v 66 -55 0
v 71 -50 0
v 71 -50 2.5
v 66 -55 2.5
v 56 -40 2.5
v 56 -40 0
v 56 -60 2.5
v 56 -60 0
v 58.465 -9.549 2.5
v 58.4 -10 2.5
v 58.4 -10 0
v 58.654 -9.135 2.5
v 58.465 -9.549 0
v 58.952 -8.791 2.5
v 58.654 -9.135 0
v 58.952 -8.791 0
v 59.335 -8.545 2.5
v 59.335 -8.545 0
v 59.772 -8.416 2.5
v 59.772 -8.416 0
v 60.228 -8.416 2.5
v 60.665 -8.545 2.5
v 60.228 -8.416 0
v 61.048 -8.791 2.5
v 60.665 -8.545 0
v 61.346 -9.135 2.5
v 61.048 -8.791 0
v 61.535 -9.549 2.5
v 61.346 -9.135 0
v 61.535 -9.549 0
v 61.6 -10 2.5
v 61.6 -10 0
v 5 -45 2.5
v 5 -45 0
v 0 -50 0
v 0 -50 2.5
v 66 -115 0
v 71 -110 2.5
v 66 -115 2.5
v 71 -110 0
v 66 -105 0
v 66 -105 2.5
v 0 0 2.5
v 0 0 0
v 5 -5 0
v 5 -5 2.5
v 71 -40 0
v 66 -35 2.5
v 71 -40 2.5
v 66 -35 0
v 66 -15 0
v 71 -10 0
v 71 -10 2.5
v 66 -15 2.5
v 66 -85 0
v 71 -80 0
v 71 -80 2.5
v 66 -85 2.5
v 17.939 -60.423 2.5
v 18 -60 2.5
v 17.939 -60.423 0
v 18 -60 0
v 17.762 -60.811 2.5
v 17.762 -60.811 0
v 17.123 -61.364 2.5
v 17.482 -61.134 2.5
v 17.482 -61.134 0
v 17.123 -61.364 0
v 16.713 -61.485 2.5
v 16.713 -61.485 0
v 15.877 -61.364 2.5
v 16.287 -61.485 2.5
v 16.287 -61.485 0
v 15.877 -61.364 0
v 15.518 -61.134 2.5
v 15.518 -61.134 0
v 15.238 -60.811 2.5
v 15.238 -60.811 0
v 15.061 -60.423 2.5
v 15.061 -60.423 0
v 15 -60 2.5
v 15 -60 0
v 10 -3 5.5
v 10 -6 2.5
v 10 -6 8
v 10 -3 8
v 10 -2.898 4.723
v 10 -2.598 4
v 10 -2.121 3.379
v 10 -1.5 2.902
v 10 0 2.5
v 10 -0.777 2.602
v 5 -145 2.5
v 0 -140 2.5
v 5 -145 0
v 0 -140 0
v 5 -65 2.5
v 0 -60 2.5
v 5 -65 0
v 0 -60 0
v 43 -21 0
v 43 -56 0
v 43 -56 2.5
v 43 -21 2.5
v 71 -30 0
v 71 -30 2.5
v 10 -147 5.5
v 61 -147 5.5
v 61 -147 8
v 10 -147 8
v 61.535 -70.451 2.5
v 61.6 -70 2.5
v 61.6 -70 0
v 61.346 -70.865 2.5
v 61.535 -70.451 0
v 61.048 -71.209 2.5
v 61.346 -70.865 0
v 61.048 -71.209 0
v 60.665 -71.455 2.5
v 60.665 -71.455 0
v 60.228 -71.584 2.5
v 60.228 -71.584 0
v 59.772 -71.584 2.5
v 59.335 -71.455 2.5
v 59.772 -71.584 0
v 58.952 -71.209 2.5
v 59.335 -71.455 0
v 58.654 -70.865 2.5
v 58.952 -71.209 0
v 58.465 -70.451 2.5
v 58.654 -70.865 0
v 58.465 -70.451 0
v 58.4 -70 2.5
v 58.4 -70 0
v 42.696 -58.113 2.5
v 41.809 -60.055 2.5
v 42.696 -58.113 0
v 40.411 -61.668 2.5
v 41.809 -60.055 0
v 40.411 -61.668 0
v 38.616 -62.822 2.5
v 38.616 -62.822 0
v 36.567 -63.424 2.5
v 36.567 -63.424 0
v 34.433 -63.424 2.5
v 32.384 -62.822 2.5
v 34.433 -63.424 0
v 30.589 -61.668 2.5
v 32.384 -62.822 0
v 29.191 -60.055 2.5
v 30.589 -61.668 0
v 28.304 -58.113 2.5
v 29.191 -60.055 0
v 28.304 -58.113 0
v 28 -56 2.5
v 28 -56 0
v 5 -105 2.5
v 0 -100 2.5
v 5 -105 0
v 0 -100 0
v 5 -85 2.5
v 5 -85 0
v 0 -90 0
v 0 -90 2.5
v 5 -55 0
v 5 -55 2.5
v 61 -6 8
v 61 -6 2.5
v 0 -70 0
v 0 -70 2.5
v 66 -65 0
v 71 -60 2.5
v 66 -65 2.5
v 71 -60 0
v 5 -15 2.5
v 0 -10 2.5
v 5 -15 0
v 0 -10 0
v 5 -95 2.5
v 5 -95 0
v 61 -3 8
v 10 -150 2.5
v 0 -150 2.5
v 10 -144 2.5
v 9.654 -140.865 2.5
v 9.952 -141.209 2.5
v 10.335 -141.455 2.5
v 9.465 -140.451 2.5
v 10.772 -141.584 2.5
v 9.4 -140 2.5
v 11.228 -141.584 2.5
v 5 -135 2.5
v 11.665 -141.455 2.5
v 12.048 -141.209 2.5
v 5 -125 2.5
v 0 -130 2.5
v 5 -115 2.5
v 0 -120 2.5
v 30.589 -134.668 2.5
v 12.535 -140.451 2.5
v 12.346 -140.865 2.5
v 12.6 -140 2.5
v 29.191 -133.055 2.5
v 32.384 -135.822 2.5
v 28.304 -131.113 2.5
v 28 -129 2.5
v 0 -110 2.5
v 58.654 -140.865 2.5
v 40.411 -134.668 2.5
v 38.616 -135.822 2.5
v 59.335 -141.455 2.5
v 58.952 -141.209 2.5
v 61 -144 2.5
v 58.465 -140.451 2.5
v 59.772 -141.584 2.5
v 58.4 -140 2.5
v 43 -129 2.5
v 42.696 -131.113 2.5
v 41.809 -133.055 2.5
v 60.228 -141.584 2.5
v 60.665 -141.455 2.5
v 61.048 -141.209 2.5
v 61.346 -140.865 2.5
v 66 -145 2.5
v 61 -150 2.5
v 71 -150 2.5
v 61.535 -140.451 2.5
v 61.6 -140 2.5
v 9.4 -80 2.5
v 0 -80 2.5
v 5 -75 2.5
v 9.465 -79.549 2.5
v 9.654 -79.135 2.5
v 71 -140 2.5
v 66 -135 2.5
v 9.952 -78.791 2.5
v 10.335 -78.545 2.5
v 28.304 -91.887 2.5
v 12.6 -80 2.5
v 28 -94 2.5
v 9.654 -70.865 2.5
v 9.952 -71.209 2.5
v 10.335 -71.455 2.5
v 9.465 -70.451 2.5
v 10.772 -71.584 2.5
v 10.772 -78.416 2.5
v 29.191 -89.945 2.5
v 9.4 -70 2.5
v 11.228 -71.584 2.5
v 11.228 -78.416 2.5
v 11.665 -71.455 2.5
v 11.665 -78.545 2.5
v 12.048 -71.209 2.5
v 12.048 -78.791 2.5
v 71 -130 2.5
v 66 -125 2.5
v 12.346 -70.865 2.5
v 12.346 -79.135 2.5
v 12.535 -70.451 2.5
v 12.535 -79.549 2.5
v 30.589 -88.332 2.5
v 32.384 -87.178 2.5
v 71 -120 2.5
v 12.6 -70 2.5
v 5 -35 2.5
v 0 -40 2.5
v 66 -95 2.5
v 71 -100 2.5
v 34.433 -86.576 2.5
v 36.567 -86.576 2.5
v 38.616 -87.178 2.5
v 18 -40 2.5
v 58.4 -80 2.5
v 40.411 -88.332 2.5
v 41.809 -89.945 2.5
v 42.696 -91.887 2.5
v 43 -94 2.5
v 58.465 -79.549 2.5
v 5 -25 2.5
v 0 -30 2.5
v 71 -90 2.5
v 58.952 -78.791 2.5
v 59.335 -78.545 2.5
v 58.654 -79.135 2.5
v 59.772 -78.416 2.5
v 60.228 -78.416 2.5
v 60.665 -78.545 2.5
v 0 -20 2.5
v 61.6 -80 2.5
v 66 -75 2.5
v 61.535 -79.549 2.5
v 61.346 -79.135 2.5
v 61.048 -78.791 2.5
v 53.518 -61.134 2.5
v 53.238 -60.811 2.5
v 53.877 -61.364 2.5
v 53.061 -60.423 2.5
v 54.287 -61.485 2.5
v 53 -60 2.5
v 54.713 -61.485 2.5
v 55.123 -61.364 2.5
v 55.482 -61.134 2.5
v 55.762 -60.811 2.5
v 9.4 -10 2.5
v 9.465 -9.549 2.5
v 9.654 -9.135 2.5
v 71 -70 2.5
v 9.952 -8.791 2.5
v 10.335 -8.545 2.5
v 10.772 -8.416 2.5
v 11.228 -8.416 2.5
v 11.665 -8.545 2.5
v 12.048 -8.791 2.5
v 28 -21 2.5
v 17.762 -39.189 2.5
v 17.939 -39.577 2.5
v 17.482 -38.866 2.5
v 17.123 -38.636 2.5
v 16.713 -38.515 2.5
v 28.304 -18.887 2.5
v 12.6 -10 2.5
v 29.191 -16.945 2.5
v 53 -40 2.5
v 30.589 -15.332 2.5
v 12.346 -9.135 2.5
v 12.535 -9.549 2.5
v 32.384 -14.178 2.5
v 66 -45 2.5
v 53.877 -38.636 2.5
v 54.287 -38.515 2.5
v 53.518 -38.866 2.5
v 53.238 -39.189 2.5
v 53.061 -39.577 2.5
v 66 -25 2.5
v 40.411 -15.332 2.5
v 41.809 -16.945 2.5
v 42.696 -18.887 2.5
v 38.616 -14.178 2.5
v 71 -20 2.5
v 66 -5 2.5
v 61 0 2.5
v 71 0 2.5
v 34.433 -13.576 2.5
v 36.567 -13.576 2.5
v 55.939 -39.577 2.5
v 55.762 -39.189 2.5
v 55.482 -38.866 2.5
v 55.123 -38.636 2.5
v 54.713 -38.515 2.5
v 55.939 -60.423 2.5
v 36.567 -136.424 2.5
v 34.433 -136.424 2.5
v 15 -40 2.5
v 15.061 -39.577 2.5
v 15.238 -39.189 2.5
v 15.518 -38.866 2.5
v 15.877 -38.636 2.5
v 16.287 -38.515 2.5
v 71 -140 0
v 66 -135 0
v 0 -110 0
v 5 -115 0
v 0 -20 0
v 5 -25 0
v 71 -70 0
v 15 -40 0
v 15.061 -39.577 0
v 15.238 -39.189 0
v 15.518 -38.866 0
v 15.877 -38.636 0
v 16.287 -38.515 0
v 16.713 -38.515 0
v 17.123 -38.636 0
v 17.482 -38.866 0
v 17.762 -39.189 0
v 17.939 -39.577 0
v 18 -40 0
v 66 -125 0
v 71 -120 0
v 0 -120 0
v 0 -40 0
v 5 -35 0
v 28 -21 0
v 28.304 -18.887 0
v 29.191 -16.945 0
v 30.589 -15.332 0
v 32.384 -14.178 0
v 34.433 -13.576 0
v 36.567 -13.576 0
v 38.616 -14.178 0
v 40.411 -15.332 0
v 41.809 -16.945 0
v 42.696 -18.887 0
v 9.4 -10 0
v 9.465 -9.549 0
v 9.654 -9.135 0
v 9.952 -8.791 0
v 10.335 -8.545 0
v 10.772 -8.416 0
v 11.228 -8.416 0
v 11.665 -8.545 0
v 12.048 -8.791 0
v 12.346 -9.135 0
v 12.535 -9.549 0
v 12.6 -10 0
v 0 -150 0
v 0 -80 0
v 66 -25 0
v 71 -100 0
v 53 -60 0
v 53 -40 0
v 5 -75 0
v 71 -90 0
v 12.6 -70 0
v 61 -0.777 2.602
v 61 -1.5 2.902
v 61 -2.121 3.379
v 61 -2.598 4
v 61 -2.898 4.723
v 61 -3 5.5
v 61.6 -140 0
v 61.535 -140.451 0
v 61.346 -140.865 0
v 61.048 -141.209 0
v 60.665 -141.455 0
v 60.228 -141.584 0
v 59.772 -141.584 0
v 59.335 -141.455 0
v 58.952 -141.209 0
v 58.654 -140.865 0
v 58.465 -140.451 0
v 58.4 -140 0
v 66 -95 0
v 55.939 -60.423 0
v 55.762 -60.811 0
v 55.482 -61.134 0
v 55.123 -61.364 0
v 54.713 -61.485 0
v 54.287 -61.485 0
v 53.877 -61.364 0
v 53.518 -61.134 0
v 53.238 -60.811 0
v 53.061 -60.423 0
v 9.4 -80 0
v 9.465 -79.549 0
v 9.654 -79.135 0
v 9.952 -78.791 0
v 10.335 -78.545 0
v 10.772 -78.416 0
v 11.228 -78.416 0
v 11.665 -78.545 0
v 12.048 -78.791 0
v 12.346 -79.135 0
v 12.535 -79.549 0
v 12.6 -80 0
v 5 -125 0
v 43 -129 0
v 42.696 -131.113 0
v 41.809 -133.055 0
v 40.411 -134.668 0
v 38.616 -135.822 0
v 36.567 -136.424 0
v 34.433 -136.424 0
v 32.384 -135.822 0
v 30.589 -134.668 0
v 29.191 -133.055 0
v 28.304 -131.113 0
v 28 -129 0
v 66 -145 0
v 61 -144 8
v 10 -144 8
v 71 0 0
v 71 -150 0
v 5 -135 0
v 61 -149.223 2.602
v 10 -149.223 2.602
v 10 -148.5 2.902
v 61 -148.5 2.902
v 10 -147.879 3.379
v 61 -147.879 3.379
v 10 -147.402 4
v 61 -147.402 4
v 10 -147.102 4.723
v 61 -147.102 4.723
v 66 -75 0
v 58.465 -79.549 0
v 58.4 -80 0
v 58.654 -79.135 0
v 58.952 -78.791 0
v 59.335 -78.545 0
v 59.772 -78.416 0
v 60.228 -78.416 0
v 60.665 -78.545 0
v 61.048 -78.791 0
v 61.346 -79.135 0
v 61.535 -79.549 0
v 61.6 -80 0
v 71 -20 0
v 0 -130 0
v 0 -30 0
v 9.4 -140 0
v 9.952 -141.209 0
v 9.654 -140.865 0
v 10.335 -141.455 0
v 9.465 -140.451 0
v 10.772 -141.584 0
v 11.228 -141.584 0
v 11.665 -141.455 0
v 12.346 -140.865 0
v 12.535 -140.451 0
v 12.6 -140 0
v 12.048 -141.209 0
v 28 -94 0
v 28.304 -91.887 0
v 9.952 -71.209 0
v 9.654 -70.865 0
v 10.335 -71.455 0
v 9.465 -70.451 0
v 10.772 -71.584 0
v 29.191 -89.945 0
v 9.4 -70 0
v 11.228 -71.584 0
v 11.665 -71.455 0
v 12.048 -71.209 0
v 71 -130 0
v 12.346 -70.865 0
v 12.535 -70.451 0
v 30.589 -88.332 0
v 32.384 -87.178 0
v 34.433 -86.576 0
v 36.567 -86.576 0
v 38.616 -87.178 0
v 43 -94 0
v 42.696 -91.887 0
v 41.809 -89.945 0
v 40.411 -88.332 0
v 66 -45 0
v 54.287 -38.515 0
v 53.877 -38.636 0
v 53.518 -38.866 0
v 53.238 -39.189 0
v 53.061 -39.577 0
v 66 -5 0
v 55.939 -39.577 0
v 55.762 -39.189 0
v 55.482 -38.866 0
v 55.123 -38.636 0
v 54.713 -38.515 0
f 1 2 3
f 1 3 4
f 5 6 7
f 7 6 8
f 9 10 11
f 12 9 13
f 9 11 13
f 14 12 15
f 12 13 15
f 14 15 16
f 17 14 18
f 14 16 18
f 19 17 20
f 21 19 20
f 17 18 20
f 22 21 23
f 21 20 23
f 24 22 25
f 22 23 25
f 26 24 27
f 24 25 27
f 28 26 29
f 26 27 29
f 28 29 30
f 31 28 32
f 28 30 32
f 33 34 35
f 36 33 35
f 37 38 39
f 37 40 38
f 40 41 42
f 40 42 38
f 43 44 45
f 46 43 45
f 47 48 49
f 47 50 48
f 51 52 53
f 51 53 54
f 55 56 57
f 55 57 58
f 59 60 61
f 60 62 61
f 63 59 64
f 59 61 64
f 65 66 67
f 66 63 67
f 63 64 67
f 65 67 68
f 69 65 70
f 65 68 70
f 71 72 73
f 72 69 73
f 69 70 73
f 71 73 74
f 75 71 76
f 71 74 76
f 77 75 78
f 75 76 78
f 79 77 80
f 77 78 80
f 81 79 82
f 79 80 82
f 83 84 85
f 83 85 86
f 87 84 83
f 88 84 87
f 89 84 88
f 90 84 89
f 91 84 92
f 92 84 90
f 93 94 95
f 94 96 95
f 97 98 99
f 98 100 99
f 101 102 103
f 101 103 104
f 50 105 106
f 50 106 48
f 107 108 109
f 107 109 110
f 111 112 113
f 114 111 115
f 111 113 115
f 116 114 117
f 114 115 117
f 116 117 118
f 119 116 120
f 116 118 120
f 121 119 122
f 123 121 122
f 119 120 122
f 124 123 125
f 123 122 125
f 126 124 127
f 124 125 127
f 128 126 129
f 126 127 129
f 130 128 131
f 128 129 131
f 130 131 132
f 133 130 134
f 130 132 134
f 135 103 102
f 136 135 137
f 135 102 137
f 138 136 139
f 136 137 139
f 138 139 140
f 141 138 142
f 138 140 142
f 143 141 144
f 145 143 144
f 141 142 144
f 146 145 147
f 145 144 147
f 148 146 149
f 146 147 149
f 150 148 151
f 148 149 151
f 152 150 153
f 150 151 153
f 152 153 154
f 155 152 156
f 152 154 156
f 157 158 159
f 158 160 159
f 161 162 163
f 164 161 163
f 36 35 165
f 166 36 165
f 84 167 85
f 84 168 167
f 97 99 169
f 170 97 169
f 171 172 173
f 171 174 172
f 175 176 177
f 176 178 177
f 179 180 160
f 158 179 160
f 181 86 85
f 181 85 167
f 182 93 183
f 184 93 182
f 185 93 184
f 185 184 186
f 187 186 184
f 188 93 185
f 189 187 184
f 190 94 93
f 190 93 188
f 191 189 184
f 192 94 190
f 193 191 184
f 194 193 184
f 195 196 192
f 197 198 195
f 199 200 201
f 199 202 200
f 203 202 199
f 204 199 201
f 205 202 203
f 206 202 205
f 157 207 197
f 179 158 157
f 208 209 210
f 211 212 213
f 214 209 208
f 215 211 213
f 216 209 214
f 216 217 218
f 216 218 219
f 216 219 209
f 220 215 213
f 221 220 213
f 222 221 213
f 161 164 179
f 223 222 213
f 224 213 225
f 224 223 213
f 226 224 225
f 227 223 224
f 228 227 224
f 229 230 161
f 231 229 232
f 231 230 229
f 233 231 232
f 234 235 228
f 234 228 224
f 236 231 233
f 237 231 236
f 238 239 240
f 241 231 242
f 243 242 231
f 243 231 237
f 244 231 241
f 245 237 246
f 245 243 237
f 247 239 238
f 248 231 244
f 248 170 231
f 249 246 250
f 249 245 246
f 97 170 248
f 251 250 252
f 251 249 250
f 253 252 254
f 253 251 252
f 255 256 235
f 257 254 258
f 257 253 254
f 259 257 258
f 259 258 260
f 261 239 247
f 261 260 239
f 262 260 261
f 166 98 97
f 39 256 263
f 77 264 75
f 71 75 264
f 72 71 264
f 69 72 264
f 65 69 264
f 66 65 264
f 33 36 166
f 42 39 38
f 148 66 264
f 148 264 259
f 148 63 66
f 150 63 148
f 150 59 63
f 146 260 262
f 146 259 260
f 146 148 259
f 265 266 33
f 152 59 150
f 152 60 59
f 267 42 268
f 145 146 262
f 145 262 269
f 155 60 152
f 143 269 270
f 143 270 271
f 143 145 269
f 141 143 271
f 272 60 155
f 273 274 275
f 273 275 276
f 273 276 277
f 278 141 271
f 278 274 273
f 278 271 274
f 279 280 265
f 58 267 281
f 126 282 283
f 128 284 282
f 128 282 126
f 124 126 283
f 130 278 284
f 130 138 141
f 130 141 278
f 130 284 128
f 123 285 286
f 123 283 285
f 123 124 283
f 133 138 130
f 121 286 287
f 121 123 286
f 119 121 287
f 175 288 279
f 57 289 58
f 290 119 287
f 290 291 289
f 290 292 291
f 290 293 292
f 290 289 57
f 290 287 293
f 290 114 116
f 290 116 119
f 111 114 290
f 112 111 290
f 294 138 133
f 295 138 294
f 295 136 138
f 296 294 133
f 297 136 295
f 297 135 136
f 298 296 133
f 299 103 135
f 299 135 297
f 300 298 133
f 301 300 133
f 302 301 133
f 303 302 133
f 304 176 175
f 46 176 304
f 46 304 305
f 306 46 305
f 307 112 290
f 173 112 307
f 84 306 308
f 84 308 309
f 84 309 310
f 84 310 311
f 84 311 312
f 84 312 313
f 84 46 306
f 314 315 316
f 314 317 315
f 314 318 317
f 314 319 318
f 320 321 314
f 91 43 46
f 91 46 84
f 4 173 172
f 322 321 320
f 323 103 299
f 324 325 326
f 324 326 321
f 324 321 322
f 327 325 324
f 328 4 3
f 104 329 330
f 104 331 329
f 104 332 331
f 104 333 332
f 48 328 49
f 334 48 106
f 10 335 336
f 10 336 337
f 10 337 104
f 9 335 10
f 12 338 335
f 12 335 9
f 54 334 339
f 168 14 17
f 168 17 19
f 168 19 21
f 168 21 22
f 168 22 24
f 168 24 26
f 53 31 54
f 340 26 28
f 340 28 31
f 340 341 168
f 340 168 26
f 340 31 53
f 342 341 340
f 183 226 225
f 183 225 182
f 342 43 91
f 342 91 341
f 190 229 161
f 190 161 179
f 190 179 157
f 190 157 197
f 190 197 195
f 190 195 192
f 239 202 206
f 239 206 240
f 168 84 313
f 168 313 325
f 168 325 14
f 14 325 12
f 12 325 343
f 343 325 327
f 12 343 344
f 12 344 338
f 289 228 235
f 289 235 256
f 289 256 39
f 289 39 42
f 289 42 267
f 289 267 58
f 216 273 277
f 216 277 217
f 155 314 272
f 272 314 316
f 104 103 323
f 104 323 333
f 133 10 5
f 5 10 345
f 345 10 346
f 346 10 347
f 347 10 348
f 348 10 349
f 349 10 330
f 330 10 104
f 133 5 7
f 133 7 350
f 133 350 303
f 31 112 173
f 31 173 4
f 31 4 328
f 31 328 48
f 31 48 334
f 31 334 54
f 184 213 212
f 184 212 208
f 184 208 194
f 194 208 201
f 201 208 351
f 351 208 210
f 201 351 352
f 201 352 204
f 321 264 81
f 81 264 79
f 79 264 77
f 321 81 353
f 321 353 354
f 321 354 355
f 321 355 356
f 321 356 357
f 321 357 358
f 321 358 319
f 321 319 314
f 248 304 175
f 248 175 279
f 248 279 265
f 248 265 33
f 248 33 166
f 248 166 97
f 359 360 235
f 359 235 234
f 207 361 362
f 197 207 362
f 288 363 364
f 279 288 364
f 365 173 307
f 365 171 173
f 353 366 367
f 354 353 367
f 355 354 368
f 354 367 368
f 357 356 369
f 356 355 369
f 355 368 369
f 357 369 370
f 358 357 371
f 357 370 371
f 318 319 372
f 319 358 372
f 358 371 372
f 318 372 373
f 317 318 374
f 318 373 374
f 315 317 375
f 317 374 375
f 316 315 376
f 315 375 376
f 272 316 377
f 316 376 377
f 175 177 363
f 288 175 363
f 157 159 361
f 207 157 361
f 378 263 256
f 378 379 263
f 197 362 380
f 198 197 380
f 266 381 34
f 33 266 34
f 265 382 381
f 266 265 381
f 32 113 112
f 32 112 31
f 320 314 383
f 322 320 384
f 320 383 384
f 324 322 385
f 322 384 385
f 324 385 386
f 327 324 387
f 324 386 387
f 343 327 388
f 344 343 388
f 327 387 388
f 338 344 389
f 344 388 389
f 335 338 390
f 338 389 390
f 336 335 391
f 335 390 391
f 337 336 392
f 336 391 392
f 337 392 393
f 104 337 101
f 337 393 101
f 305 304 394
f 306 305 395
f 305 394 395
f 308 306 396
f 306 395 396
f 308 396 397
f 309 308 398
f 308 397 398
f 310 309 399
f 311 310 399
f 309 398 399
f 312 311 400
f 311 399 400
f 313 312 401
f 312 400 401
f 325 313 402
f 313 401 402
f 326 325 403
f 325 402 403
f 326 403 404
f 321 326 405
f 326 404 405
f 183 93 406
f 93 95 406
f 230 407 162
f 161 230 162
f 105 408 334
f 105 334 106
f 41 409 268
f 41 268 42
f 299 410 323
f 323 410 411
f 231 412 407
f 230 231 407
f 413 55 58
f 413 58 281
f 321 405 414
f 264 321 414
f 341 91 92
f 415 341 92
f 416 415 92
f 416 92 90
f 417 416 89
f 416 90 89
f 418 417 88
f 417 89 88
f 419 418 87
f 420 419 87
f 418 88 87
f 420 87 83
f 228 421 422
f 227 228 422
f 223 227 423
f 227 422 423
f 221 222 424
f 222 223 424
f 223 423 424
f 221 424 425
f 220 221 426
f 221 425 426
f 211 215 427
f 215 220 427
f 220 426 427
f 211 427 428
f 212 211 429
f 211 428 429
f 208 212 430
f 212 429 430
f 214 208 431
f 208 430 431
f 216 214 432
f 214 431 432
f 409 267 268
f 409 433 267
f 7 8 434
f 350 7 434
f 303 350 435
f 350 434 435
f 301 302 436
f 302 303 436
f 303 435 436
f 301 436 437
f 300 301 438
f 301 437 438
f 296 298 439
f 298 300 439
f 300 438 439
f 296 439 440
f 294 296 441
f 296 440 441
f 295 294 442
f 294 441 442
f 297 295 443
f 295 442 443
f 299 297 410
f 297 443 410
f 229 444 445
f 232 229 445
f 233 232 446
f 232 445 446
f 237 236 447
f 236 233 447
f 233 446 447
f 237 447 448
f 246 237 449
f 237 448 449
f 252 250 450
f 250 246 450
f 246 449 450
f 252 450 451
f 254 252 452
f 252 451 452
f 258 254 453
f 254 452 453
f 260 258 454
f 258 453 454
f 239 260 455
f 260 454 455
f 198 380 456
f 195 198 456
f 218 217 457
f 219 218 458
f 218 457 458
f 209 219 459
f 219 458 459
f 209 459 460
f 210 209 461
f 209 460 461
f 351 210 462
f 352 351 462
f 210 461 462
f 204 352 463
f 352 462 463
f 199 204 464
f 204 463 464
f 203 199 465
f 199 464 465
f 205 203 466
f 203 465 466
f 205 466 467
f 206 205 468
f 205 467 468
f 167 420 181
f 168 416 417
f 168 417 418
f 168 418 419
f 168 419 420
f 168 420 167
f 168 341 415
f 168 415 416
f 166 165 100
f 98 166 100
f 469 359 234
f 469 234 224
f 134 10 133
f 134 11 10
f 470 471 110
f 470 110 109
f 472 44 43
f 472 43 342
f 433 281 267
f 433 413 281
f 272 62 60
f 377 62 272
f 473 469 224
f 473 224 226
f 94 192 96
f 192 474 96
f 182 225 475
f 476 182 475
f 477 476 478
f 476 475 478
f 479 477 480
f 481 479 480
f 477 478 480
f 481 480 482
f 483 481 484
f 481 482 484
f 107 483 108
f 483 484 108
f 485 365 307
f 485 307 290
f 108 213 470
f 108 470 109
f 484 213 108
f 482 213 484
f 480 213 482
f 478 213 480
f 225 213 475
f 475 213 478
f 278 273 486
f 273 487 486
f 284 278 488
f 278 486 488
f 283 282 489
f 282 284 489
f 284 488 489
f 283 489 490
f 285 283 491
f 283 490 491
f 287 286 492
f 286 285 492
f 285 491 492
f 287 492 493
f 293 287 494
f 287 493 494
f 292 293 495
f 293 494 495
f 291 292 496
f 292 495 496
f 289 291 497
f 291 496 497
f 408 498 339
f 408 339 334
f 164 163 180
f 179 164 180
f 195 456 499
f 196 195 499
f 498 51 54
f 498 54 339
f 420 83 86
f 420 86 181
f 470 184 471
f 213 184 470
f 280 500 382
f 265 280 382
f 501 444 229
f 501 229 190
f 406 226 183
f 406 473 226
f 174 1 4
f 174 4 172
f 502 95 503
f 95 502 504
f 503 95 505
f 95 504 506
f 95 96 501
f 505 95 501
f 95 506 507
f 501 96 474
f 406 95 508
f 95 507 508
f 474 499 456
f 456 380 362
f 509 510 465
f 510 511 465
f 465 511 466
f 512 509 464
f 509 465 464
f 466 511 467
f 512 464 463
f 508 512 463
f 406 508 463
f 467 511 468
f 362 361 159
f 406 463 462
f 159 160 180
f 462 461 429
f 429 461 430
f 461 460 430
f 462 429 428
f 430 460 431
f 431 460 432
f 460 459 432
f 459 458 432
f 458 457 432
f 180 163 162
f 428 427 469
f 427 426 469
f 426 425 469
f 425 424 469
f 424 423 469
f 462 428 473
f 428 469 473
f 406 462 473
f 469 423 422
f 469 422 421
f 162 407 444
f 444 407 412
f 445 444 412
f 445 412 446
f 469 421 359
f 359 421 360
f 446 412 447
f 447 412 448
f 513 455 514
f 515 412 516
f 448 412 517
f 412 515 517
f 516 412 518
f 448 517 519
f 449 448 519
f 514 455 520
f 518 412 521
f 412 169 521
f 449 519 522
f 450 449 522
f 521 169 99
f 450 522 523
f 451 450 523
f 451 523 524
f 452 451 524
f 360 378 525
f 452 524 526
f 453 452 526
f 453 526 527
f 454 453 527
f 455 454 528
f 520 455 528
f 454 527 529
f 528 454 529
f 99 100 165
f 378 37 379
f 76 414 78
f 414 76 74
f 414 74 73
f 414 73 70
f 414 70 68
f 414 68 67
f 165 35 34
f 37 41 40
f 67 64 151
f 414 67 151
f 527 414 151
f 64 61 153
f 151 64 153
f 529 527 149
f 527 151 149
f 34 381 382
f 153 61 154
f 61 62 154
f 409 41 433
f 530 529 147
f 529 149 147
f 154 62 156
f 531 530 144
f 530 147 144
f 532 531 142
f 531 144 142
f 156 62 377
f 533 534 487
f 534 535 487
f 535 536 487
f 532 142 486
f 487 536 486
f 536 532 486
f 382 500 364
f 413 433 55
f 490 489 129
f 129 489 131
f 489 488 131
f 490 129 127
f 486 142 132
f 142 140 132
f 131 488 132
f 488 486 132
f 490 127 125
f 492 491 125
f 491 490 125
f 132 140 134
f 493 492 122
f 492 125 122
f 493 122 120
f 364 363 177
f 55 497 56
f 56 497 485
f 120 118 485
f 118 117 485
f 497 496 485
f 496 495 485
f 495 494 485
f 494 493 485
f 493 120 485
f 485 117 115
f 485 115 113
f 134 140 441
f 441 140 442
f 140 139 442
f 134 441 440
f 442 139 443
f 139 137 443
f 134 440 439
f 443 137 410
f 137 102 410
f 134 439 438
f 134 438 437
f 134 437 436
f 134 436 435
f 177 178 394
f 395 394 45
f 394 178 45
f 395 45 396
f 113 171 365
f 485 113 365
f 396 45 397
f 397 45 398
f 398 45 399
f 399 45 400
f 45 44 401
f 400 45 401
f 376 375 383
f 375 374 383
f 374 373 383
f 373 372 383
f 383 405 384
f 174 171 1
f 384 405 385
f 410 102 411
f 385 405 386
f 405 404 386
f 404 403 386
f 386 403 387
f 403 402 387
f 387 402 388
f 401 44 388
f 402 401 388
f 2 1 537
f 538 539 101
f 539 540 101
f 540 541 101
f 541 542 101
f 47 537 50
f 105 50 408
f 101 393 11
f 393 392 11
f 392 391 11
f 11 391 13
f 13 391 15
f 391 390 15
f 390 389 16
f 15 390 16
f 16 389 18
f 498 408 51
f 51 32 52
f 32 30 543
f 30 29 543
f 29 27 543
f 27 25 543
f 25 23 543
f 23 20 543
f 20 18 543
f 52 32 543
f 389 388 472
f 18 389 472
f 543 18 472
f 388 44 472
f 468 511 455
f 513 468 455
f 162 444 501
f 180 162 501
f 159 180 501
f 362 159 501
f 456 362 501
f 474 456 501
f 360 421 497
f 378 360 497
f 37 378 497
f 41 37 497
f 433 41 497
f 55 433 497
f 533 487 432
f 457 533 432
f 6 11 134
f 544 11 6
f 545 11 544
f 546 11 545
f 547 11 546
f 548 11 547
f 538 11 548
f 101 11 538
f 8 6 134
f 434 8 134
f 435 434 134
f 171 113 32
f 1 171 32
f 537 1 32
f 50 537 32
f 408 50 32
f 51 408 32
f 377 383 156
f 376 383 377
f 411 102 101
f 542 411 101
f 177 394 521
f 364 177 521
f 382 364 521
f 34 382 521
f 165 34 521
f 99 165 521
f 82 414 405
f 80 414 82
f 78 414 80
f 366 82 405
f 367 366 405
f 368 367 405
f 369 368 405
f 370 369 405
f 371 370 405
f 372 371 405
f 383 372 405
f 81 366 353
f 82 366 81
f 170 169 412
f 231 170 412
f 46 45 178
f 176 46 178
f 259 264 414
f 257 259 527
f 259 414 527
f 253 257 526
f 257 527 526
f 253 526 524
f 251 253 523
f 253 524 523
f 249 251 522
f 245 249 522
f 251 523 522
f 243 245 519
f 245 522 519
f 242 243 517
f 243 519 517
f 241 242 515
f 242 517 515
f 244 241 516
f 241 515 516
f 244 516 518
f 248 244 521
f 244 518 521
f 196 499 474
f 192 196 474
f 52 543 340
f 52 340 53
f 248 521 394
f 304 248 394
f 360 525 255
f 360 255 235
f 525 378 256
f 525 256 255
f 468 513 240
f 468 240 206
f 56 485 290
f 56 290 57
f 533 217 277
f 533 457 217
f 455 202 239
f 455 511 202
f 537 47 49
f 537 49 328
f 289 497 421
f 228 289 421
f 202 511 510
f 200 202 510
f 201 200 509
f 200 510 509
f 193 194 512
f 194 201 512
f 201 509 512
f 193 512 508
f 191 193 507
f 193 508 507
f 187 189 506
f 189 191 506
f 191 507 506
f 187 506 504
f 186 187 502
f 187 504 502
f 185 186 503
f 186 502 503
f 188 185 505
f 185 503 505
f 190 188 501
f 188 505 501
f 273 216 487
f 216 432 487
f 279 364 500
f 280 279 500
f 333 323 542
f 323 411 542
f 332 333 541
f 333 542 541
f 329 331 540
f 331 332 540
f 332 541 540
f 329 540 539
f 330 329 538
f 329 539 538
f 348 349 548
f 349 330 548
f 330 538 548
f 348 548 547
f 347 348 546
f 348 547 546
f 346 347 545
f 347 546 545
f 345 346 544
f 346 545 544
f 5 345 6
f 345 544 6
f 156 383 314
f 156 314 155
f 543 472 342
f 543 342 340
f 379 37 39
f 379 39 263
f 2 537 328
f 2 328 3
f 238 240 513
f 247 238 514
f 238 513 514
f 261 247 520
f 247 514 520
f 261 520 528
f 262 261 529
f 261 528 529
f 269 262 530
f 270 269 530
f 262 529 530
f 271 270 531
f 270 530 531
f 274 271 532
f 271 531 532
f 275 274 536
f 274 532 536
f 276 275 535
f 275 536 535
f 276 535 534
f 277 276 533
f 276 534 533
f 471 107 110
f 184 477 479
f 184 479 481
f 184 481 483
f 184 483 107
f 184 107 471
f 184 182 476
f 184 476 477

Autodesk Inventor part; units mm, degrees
ref_plane "YZ Plane" through (0, 0, 0) normal (1, 0, 0) x (0, 1, 0)
ref_plane "XZ Plane" through (0, 0, 0) normal (0, 1, 0) x (-1, 0, 0)
ref_plane "XY Plane" through (0, 0, 0) normal (0, 0, 1) x (1, 0, 0)
sketch "Sketch1" plane through (0, 0, 0) normal (0, 0, 1) x (1, 0, 0)
  line L0 (0, 0) -> (71, 0)
  line L1 (71, 0) -> (71, -150)
  line L2 (71, -150) -> (0, -150)
  line L3 (0, -150) -> (0, 0)
  line L4 (7.6868, 0) -> (92.3291, 0)
  line L5 (9.7325, -150) -> (92.3291, -150)
  line L6 (9.7325, -150) -> (11.7224, -150)
  line L7 (0, 0) -> (5, -5)
  line L8 (0, 0) -> (7.0711, 0) construction
  line L9 (5, -5) -> (0, -10)
  line L10 (0, -10) -> (5, -15)
  line L11 (5, -15) -> (0, -20)
  line L12 (0, -20) -> (5, -25)
  line L13 (5, -25) -> (0, -30)
  line L14 (0, -30) -> (5, -35)
  line L15 (5, -35) -> (0, -40)
  line L16 (0, -40) -> (5, -45)
  line L17 (5, -45) -> (0, -50)
  line L18 (0, -50) -> (5, -55)
  line L19 (5, -55) -> (0, -60)
  line L20 (0, -60) -> (5, -65)
  line L21 (5, -65) -> (0, -70)
  line L22 (0, -70) -> (5, -75)
  line L23 (5, -75) -> (0, -80)
  line L24 (0, -80) -> (5, -85)
  line L25 (5, -85) -> (0, -90)
  line L26 (0, -90) -> (5, -95)
  line L27 (5, -95) -> (0, -100)
  line L28 (0, -100) -> (5, -105)
  line L29 (5, -105) -> (0, -110)
  line L30 (0, -110) -> (5, -115)
  line L31 (5, -115) -> (0, -120)
  line L32 (0, -120) -> (5, -125)
  line L33 (5, -125) -> (0, -130)
  line L34 (0, -130) -> (5, -135)
  line L35 (5, -135) -> (0, -140)
  line L36 (35.5, 0) -> (35.5, -140) construction
  line L37 (71, 0) -> (66, -5)
  line L38 (66, -5) -> (71, -10)
  line L39 (71, -10) -> (66, -15)
  line L40 (66, -15) -> (71, -20)
  line L41 (71, -20) -> (66, -25)
  line L42 (66, -25) -> (71, -30)
  line L43 (71, -30) -> (66, -35)
  line L44 (66, -35) -> (71, -40)
  line L45 (71, -40) -> (66, -45)
  line L46 (66, -45) -> (71, -50)
  line L47 (71, -50) -> (66, -55)
  line L48 (66, -55) -> (71, -60)
  line L49 (71, -60) -> (66, -65)
  line L50 (66, -65) -> (71, -70)
  line L51 (71, -70) -> (66, -75)
  line L52 (66, -75) -> (71, -80)
  line L53 (71, -80) -> (66, -85)
  line L54 (66, -85) -> (71, -90)
  line L55 (71, -90) -> (66, -95)
  line L56 (66, -95) -> (71, -100)
  line L57 (71, -100) -> (66, -105)
  line L58 (66, -105) -> (71, -110)
  line L59 (71, -110) -> (66, -115)
  line L60 (66, -115) -> (71, -120)
  line L61 (71, -120) -> (66, -125)
  line L62 (66, -125) -> (71, -130)
  line L63 (71, -130) -> (66, -135)
  line L64 (66, -135) -> (71, -140)
  line L65 (10, -3) -> (61, -3)
  line L66 (61, -3) -> (61, -6)
  line L67 (61, -6) -> (10, -6)
  line L68 (10, -6) -> (10, -3)
  line L69 (10, -144) -> (61, -144)
  line L70 (61, -144) -> (61, -147)
  line L71 (61, -147) -> (10, -147)
  line L72 (10, -147) -> (10, -144)
  line L73 (0, -140) -> (5, -145)
  line L74 (5, -145) -> (0, -150)
  line L75 (66, -5) -> (71, -10)
  line L76 (71, -140) -> (66, -145)
  line L77 (66, -145) -> (71, -150)
  line L78 (11, -80) -> (11, -140) construction
  line L79 (9.4, -80) -> (9.4, -140)
  line L80 (12.6, -140) -> (12.6, -80)
  arc A0 (12.6, -80) -> (9.4, -80) centre (11, -80) ccw
  arc A1 (9.4, -140) -> (12.6, -140) centre (11, -140) ccw
  line L81 (16.5, -40) -> (16.5, -60) construction
  line L82 (15, -40) -> (15, -60)
  line L83 (18, -60) -> (18, -40)
  arc A2 (18, -40) -> (15, -40) centre (16.5, -40) ccw
  arc A3 (15, -60) -> (18, -60) centre (16.5, -60) ccw
  line L84 (54.5, -40) -> (54.5, -60) construction
  line L85 (56, -40) -> (56, -60)
  line L86 (53, -60) -> (53, -40)
  arc A4 (56, -40) -> (53, -40) centre (54.5, -40) ccw
  arc A5 (53, -60) -> (56, -60) centre (54.5, -60) ccw
  line L87 (60, -80) -> (60, -140) construction
  line L88 (61.6, -80) -> (61.6, -140)
  line L89 (58.4, -140) -> (58.4, -80)
  arc A6 (61.6, -80) -> (58.4, -80) centre (60, -80) ccw
  arc A7 (58.4, -140) -> (61.6, -140) centre (60, -140) ccw
  line L90 (35.5, -129) -> (35.5, -94) construction
  line L91 (43, -129) -> (43, -94)
  line L92 (28, -94) -> (28, -129)
  arc A8 (28, -129) -> (43, -129) centre (35.5, -129) ccw
  arc A9 (43, -94) -> (28, -94) centre (35.5, -94) ccw
  line L93 (35.5, -56) -> (35.5, -21) construction
  line L94 (43, -56) -> (43, -21)
  line L95 (28, -21) -> (28, -56)
  arc A10 (28, -56) -> (43, -56) centre (35.5, -56) ccw
  arc A11 (43, -21) -> (28, -21) centre (35.5, -21) ccw
  line L96 (71, -75) -> (0, -75) construction
  line L97 (11, -70) -> (11, -10) construction
  line L98 (9.4, -70) -> (9.4, -10)
  line L99 (12.6, -10) -> (12.6, -70)
  arc A12 (9.4, -70) -> (12.6, -70) centre (11, -70) ccw
  arc A13 (12.6, -10) -> (9.4, -10) centre (11, -10) ccw
  line L100 (61.6, -70) -> (61.6, -10)
  line L101 (58.4, -10) -> (58.4, -70)
  line L102 (60, -70) -> (60, -10) construction
  arc A14 (61.6, -10) -> (58.4, -10) centre (60, -10) ccw
  arc A15 (58.4, -70) -> (61.6, -70) centre (60, -70) ccw
  point P0 (11, -110)
  point P1 (16.5, -50)
  point P2 (54.5, -50)
  point P3 (60, -110)
  point P4 (35.5, -111.5)
  point P5 (35.5, -38.5)
  point P6 (11, -40)
  point P7 (60, -40)
  dimension "d0" = 71
  dimension "d1" = 150
  dimension "d2" = 45
  dimension "d3" = 5
  dimension "d6" = 10
  dimension "d11" = 35.5
  dimension "d12" = 10
  dimension "d13" = 10
  dimension "d14" = 3
  dimension "d15" = 10
  dimension "d16" = 3
  dimension "d17" = 138
  dimension "d19" = 6
  dimension "d20" = 3.2
  dimension "d21" = 11
  dimension "d22" = 10
  dimension "d24" = 51
  dimension "d25" = 3
  dimension "d26" = 4
  dimension "d27" = 40
  dimension "d28" = 20
  dimension "d29" = 35
  dimension "d30" = 41
  dimension "d36" = 35
  dimension "d37" = 15
  dimension "d38" = 15
  dimension "d39" = 35
  dimension "d40" = 15
  dimension "d41" = 15
  dimension "d44" = 60
  dimension "d45" = 75
extrude "Extrusion1" add sketch "Sketch1" along normal blind 2.5 contours L0 L37 L38 L39 L40 L41 L42 L43 L44 L45 L46 L47 L48 L49 L50 L51 L52 L53 L54 L55 L56 L57 L58 L59 L60 L61 L62 L63 L64 L76 L77 L2 L74 L73 L35 L34 L33 L32 L31 L30 L29 L28 L27 L26 L25 L24 L23 L22 L21 L20 L19 L18 L17 L16 L15 L14 L13 L12 L11 L10 L9 L7 | L65 L66 L67 L68 | L69 L70 L71 L72 | A8 L92 A9 L91 | A10 L95 A11 L94 | L98 A13 L99 A12 | A15 L101 A14 L100
extrude "Extrusion2" add sketch "Sketch1" along normal blind 8 contours L65 L66 L67 L68 | L69 L70 L71 L72
fillet "Fillet1" radius 3 2 edges at (35.5, -147, 2.5) (35.5, -3, 2.5)
extrude "Extrusion3" cut sketch "Sketch1" along normal through all contours A8 L92 A9 L91 | A10 L95 A11 L94
extrude "Extrusion4" cut sketch "Sketch1" along normal through all contours L98 A13 L99 A12 | A15 L101 A14 L100
equation "\"d11\" = 0.5 * d0"
equation "\"d13\" = d12"
equation "\"d15\" = d12"
equation "\"d16\" = d14"
equation "\"d19\" = -0.5 * d17 + 0.5 * d1"
equation "\"d45\" = 0.5 * d1"
properties part number "tray"
